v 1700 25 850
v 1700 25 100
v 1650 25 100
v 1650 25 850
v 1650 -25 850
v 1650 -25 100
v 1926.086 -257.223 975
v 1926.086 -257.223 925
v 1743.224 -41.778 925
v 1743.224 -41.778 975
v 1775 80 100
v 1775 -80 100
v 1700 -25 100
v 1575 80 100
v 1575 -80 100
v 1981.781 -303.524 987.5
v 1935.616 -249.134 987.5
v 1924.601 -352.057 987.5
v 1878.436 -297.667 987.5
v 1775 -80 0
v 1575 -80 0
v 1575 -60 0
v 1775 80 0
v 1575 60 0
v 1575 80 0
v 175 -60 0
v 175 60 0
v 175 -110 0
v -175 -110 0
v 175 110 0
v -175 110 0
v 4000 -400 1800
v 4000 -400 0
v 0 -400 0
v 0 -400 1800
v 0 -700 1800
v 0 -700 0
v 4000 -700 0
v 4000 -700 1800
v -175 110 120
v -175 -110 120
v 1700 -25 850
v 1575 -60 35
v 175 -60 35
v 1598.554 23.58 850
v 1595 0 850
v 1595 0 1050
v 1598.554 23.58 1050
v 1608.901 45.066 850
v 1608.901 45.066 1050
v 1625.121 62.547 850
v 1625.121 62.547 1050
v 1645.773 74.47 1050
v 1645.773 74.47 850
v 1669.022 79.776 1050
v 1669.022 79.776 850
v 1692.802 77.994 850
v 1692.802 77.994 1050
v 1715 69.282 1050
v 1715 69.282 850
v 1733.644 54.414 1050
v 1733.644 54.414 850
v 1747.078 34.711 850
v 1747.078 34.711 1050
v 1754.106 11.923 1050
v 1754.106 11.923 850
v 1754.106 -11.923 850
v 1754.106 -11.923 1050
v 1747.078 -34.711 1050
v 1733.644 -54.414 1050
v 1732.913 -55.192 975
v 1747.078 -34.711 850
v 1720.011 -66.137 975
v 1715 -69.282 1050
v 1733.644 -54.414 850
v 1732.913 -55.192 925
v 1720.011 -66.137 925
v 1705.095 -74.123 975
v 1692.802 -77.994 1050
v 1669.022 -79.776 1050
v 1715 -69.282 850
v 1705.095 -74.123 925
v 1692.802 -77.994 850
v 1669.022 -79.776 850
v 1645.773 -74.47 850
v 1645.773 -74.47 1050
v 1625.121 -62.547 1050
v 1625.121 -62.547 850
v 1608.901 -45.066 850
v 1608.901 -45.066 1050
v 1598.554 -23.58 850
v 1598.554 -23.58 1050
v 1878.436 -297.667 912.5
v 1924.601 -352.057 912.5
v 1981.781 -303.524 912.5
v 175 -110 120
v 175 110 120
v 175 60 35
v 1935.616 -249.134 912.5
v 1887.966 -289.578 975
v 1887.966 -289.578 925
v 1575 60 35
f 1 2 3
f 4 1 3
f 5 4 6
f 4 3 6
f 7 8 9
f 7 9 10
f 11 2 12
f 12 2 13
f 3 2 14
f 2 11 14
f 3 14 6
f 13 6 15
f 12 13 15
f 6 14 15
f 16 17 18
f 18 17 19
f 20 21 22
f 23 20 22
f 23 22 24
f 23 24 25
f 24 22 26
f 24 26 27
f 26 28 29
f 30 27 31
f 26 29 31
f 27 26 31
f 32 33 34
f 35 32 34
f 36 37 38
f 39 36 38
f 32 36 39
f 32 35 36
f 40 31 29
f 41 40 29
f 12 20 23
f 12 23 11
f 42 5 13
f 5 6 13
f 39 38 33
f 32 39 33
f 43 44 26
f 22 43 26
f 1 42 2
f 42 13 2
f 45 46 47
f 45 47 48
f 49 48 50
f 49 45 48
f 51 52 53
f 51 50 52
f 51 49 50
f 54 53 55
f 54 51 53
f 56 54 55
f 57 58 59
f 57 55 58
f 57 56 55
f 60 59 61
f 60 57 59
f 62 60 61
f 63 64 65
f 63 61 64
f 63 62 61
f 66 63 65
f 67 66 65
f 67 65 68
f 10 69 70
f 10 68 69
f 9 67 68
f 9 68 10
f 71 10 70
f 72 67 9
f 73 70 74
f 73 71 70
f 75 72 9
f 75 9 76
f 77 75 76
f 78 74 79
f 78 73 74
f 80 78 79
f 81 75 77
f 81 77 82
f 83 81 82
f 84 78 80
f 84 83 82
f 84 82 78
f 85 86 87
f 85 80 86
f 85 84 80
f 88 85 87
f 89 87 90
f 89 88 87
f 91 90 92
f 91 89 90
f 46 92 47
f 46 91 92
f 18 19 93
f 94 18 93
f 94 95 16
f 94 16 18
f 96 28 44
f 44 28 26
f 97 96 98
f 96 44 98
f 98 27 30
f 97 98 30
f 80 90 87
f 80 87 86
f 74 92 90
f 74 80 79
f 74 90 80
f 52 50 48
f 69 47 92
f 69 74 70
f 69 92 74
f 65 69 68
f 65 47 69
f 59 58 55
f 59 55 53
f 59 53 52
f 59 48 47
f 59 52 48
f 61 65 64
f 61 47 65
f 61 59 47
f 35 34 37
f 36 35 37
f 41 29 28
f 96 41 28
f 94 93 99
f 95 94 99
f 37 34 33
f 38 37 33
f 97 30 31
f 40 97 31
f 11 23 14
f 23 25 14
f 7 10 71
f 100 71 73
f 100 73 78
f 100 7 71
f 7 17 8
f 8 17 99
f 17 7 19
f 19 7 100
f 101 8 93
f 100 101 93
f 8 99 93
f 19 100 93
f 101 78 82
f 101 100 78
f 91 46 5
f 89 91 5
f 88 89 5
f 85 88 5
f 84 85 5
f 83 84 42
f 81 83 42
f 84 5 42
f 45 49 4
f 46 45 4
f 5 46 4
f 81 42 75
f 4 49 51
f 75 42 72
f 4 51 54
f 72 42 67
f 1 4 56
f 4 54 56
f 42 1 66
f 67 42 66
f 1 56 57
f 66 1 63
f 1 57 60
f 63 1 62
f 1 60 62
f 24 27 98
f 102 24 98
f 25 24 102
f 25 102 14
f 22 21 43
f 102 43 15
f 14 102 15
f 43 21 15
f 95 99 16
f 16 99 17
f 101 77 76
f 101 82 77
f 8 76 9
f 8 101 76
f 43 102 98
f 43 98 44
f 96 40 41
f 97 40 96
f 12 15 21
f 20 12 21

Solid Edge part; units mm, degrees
sketch "Sketch1" plane through (0, 0, 0) normal (0, 0, 1) x (1, 0, 0)
  line L0 (4000, -700) -> (4000, -400)
  line L1 (4000, -400) -> (0, -400)
  line L2 (0, -400) -> (0, -700)
  line L3 (0, -700) -> (4000, -700)
extrude "Protrusion1" add sketch "Sketch1" along normal blind 1800
sketch "Sketch2" plane through (0, 0, 0) normal (0, 0, 1) x (1, 0, 0)
  line L0 (175, 110) -> (-175, 110)
  line L1 (-175, 110) -> (-175, -110)
  line L2 (-175, -110) -> (175, -110)
  line L3 (175, -110) -> (175, 110)
extrude "ExtrudedProtrusion_2" add sketch "Sketch2" along normal blind 120
sketch "Sketch3" plane through (175, 0, 60) normal (1, 0, 0) x (0, 1, 0)
  line L0 (60, -25) -> (-60, -25)
  line L1 (-60, -25) -> (-60, -60)
  line L2 (-60, -60) -> (60, -60)
  line L3 (60, -60) -> (60, -25)
extrude "ExtrudedProtrusion_3" add sketch "Sketch3" along normal blind 1400
sketch "Sketch4" plane through (1575, 0, 17.5) normal (1, 0, 0) x (0, 1, 0)
  line L0 (80, 82.5) -> (-80, 82.5)
  line L1 (-80, 82.5) -> (-80, -17.5)
  line L2 (-80, -17.5) -> (80, -17.5)
  line L3 (80, -17.5) -> (80, 82.5)
extrude "ExtrudedProtrusion_4" add sketch "Sketch4" along normal blind 200
sketch "Sketch5" plane through (1675, 0, 100) normal (0, 0, 1) x (0, 1, 0)
  line L0 (25, -25) -> (25, 25)
  line L1 (25, 25) -> (-25, 25)
  line L2 (-25, 25) -> (-25, -25)
  line L3 (-25, -25) -> (25, -25)
extrude "ExtrudedProtrusion_5" add sketch "Sketch5" along normal blind 750
sketch "Sketch6" plane through (1675, 0, 850) normal (0, 0, 1) x (-1, 0, 0)
  circle A0 centre (0, 0) radius 80
extrude "ExtrudedProtrusion_6" add sketch "Sketch6" along normal blind 200
sketch "Sketch7" plane through (1907.0262, -273.4002, 950) normal (0.6471, -0.7624, 0) x (0, 0, -1)
  line L0 (25, 25) -> (-25, 25)
  line L1 (-25, 25) -> (-25, -25)
  line L2 (-25, -25) -> (25, -25)
  line L3 (25, -25) -> (25, 25)
extrude "Protrusion2" add sketch "Sketch7" against normal up to vertex (358.5858 mm away)
sketch "Sketch8" plane through (1907.0262, -273.4002, 950) normal (0.6471, -0.7624, 0) x (0, 0, -1)
  line L0 (37.5, 37.5) -> (-37.5, 37.5)
  line L1 (-37.5, 37.5) -> (-37.5, -37.5)
  line L2 (-37.5, -37.5) -> (37.5, -37.5)
  line L3 (37.5, -37.5) -> (37.5, 37.5)
extrude "ExtrudedProtrusion_10" add sketch "Sketch8" along normal blind 71.3402
